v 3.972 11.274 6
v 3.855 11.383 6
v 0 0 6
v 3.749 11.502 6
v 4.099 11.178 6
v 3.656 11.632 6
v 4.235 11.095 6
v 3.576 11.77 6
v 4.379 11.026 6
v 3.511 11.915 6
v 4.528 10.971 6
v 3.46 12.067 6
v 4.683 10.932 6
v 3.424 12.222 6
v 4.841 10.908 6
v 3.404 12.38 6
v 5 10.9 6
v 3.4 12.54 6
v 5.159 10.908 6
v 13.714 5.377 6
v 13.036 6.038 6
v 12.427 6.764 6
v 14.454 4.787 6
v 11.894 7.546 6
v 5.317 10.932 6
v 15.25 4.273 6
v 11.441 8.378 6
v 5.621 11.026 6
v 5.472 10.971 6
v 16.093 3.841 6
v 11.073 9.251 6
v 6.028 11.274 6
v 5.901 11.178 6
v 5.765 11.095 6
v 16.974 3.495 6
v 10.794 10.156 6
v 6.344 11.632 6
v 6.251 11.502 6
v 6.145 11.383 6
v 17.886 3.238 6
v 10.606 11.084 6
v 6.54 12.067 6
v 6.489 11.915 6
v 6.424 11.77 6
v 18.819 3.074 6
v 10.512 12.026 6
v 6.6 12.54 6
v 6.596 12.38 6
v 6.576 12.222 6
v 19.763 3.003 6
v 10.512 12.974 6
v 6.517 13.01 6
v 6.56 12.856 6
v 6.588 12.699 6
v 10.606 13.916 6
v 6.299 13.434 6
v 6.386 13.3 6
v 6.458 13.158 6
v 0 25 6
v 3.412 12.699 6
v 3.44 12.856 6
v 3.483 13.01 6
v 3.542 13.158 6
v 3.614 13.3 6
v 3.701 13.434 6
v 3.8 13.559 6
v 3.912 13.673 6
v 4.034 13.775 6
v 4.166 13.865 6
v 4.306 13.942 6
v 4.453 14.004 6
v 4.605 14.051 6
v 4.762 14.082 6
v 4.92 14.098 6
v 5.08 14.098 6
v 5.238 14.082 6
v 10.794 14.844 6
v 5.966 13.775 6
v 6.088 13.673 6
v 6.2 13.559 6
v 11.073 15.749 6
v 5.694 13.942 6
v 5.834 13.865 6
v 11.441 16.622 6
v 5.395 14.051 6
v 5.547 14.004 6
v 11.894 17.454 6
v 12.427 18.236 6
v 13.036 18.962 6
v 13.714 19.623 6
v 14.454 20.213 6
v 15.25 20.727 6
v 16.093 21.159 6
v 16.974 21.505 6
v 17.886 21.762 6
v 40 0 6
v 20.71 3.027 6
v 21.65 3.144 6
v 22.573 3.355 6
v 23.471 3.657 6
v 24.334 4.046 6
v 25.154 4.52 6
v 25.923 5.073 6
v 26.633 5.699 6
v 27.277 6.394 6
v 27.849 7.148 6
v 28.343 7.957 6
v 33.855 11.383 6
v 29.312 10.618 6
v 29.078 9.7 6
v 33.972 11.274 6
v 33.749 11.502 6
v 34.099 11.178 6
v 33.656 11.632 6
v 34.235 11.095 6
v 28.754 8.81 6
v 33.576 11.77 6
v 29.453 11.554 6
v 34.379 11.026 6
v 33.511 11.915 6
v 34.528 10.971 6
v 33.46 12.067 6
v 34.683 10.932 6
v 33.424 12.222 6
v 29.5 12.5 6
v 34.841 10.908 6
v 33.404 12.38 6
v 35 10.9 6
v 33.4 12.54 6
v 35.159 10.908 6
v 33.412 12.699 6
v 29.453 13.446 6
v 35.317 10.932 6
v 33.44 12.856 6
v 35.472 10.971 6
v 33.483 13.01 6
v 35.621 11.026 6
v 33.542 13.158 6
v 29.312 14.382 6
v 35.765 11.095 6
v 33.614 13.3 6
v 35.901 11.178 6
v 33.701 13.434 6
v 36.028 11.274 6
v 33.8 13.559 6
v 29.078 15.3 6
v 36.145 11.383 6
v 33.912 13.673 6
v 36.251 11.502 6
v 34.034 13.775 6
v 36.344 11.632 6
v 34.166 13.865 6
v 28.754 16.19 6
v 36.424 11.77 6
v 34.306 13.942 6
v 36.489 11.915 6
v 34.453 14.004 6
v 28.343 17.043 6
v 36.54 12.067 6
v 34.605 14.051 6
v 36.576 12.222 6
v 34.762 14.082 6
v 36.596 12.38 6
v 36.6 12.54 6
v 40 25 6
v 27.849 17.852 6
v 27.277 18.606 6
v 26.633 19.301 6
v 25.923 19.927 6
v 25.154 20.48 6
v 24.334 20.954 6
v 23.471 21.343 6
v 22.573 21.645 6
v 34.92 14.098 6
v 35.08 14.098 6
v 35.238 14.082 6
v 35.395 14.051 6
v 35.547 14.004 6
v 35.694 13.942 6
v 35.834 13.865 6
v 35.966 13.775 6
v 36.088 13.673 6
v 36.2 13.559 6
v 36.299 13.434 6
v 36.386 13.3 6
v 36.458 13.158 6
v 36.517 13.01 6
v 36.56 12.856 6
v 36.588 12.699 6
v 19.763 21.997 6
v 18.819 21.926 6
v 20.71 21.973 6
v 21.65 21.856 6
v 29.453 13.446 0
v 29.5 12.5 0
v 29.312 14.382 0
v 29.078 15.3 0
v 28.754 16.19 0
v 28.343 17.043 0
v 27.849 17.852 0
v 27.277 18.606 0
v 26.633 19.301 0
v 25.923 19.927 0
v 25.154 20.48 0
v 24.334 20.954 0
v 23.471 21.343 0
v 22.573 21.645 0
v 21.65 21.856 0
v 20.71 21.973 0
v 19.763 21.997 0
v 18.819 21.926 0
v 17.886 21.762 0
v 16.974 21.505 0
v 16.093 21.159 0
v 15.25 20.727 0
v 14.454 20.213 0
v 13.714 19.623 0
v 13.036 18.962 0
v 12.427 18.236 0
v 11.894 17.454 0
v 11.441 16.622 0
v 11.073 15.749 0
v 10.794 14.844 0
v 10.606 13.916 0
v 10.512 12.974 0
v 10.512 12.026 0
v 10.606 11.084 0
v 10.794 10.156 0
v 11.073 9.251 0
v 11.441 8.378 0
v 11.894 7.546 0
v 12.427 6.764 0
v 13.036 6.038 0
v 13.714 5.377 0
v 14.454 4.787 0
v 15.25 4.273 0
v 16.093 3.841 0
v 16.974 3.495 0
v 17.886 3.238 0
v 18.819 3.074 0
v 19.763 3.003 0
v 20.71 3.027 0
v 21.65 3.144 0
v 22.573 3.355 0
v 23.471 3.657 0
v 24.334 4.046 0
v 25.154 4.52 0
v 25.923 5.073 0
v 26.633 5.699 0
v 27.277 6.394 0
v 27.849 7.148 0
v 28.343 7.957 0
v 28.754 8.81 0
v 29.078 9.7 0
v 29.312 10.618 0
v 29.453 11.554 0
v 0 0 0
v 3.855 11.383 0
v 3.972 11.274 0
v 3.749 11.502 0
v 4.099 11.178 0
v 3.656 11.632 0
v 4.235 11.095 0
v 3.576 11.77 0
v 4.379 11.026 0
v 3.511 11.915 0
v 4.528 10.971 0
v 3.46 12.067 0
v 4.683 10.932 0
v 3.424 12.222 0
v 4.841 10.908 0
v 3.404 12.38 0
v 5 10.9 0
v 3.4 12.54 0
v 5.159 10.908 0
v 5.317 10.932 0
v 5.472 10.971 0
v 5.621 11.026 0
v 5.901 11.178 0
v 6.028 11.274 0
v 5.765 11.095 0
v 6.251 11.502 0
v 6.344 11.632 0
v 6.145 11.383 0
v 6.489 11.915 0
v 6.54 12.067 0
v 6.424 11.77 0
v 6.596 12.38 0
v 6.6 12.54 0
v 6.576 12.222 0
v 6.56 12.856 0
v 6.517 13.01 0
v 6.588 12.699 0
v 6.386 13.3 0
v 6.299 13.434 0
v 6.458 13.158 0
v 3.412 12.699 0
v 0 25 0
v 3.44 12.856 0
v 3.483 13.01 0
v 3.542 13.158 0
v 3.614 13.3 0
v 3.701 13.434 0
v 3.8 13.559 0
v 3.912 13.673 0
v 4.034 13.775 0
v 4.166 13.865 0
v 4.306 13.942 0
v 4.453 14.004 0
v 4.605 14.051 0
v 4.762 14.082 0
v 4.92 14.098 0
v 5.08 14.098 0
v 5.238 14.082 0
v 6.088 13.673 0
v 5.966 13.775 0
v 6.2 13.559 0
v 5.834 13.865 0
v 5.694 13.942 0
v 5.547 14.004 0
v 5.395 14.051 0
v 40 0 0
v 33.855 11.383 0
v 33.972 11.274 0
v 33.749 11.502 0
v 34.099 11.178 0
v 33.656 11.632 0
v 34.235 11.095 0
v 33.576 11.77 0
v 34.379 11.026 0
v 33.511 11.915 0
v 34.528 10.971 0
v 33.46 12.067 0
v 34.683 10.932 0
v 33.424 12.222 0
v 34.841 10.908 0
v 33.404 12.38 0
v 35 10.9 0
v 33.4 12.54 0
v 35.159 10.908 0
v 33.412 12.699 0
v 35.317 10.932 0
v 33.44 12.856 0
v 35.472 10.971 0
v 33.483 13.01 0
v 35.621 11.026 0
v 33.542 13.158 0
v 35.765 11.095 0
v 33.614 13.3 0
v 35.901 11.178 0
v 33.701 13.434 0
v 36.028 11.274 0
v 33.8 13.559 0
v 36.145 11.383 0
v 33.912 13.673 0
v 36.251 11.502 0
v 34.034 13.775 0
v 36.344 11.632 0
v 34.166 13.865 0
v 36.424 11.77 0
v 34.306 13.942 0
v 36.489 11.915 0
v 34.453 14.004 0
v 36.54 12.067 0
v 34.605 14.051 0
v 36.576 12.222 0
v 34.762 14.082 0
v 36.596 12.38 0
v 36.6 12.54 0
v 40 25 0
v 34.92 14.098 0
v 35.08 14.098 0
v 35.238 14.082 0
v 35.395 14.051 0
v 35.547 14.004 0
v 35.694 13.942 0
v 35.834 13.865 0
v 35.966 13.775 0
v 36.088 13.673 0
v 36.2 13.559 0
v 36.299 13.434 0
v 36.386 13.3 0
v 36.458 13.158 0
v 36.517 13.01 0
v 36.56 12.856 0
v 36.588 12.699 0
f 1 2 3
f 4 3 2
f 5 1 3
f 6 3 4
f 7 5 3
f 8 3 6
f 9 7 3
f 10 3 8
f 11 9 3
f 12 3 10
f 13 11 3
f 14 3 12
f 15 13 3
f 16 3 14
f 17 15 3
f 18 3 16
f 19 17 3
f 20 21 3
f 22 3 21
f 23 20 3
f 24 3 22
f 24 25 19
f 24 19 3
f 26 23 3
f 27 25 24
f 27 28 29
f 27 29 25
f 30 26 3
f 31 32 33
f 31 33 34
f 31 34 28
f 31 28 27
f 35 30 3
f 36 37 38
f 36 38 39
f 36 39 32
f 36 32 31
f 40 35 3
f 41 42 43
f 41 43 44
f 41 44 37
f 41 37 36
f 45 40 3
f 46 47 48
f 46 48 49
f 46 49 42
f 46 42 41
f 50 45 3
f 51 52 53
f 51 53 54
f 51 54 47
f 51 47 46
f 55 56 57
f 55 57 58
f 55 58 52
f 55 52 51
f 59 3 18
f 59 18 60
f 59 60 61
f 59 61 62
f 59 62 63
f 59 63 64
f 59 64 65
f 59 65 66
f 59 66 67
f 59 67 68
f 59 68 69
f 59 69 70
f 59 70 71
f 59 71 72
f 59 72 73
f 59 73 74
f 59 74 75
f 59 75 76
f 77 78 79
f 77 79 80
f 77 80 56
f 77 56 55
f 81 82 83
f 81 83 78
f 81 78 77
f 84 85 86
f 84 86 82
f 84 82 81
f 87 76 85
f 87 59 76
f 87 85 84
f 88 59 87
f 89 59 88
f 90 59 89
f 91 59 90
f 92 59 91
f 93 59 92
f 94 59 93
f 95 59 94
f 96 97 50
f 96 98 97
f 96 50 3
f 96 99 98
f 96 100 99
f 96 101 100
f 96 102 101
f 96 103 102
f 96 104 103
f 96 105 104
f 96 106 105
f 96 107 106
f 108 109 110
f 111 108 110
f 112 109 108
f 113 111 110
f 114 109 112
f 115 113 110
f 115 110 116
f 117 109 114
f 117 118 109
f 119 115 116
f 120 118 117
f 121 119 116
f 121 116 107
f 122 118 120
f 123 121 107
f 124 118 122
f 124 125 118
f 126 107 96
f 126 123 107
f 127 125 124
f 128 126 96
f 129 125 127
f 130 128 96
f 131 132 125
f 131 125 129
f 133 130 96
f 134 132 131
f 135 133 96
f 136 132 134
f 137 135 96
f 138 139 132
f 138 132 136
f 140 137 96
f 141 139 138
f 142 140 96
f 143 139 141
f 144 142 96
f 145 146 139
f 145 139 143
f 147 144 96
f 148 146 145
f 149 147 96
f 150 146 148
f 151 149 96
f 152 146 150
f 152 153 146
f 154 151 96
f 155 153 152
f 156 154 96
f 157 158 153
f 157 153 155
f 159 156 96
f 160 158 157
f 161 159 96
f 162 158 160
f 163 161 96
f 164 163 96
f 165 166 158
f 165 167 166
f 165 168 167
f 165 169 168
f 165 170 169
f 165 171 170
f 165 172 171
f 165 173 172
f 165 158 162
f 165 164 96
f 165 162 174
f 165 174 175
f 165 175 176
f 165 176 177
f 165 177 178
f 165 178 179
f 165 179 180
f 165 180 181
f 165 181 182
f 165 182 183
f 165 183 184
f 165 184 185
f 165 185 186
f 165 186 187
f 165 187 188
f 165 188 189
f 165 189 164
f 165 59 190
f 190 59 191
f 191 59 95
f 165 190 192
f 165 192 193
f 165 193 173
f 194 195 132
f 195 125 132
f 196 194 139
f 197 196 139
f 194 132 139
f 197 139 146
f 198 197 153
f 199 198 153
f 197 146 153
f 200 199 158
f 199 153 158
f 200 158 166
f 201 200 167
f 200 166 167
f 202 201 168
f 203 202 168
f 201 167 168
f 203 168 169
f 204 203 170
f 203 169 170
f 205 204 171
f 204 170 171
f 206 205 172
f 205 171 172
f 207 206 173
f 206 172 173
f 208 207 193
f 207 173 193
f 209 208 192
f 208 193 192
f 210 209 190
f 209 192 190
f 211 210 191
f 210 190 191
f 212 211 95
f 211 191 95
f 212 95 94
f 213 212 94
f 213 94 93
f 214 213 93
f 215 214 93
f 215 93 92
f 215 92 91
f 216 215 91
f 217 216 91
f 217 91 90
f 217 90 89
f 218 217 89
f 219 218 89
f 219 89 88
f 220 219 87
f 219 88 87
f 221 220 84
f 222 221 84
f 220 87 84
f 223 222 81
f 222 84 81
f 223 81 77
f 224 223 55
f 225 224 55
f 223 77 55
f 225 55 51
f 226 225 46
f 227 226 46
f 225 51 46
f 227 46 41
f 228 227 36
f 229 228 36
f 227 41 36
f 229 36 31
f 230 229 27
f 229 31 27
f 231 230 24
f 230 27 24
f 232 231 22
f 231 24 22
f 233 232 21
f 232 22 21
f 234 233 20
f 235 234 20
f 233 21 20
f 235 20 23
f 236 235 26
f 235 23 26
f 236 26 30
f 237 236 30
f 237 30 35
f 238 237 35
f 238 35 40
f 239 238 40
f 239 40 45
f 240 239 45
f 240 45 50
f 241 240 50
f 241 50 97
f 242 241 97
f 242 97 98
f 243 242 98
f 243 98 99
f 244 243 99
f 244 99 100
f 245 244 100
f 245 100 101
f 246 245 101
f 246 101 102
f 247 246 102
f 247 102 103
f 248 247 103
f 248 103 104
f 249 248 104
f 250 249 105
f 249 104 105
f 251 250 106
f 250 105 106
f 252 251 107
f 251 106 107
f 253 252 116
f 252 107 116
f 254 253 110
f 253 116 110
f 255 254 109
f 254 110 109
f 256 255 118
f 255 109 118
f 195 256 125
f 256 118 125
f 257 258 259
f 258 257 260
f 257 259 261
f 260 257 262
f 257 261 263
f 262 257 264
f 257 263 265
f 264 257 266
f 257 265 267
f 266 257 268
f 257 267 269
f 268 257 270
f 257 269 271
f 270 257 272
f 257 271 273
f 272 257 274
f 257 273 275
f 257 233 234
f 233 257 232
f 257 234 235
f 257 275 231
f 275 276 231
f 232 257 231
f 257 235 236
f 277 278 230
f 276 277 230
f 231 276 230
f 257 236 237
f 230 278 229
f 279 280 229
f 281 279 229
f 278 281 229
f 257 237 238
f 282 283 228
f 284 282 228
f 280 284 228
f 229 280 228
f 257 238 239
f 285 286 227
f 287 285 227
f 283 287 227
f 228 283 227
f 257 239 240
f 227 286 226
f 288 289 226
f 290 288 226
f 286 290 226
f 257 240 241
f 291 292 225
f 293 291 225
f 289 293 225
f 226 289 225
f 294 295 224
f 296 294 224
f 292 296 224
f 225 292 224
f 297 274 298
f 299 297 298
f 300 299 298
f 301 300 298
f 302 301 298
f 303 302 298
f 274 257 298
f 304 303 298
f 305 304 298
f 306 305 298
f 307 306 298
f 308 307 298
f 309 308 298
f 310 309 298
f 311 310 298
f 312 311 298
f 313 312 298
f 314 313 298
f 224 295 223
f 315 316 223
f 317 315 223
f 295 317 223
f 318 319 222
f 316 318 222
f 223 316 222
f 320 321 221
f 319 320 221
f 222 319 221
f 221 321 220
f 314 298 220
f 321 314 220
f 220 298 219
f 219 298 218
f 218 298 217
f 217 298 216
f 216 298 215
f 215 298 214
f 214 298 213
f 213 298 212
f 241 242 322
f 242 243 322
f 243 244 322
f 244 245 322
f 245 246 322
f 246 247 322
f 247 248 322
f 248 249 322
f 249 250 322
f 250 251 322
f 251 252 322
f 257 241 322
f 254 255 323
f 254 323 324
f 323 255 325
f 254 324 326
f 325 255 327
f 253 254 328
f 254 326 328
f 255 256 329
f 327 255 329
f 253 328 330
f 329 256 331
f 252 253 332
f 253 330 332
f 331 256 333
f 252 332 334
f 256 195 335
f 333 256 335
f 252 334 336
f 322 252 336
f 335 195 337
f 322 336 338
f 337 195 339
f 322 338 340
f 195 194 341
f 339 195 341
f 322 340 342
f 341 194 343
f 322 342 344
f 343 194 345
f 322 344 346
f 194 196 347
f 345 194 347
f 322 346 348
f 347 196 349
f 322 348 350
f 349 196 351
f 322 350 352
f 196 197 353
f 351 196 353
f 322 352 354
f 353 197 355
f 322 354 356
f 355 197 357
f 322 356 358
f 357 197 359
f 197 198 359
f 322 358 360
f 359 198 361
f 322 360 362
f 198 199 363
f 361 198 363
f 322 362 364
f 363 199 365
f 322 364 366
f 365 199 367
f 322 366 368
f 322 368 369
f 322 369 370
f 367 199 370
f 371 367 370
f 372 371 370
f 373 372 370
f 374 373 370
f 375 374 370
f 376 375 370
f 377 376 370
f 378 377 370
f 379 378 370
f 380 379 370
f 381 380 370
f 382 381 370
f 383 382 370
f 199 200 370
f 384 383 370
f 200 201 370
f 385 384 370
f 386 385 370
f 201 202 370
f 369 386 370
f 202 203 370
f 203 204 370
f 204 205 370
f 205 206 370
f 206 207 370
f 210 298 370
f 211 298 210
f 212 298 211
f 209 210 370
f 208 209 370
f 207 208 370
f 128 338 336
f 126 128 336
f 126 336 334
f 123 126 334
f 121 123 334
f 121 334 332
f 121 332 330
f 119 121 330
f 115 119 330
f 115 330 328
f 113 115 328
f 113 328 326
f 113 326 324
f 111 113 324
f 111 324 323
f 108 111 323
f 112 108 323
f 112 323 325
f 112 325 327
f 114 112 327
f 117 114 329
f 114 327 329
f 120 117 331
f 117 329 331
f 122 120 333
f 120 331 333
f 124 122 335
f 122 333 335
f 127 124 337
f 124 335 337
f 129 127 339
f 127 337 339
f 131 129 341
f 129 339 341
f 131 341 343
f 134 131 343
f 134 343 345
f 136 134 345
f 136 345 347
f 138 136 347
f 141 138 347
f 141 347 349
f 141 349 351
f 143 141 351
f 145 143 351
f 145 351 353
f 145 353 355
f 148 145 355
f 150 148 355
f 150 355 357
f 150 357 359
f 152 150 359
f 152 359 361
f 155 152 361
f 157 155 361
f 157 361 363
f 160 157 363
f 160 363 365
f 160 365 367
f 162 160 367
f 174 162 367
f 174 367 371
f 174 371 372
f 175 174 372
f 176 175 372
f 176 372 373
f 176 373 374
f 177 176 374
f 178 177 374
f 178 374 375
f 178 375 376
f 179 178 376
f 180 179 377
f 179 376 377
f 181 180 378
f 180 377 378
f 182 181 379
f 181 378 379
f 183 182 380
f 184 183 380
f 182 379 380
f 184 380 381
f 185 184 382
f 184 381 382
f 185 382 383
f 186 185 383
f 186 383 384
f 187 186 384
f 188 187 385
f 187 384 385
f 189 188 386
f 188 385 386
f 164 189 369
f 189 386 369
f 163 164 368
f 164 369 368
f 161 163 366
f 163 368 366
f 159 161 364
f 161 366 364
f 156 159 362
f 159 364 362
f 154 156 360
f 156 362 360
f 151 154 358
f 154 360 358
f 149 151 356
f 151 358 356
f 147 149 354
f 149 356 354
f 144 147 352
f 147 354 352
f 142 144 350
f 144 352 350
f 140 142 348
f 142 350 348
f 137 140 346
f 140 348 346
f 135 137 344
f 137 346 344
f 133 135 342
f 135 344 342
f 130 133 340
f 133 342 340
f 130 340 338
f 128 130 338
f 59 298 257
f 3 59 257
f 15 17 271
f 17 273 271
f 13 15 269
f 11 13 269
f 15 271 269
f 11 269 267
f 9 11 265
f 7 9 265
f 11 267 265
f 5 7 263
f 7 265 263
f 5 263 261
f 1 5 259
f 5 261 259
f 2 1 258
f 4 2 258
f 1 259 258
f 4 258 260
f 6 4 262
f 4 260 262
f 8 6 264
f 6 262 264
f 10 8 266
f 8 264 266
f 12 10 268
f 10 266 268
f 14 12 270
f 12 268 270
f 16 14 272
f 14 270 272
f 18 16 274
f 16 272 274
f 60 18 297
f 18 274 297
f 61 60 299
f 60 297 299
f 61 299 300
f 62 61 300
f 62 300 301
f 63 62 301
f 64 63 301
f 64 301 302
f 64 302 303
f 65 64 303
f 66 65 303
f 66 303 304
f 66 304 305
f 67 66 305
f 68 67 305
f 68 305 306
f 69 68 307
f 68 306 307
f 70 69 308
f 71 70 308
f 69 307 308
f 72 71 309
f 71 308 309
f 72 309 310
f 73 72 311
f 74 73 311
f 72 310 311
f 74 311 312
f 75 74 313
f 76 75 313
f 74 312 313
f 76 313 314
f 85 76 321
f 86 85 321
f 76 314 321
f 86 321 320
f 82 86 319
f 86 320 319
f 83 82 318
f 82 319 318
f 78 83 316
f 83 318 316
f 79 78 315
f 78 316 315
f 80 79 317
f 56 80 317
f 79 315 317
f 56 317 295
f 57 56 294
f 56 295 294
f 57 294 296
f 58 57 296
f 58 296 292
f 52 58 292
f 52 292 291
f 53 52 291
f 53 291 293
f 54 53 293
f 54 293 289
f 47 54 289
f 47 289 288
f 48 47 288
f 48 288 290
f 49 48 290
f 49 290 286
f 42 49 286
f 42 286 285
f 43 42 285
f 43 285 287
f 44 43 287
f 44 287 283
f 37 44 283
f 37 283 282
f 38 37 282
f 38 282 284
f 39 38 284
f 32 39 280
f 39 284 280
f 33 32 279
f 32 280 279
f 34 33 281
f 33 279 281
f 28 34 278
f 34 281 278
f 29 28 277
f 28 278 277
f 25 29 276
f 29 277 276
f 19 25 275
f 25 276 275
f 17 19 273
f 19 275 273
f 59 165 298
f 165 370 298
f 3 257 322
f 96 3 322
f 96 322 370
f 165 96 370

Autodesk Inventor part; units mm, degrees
ref_plane "YZ Plane" through (0, 0, 0) normal (1, 0, 0) x (0, 1, 0)
ref_plane "XZ Plane" through (0, 0, 0) normal (0, 1, 0) x (-1, 0, 0)
ref_plane "XY Plane" through (0, 0, 0) normal (0, 0, 1) x (1, 0, 0)
sketch "スケッチ1" plane through (0, 0, 0) normal (0, 0, 1) x (1, 0, 0)
  line L0 (0, 0) -> (40, 0)
  line L1 (40, 0) -> (40, 25)
  line L2 (40, 25) -> (0, 25)
  line L3 (0, 25) -> (0, 0)
  dimension "d0" = 40
  dimension "d1" = 25
extrude "押し出し1" add sketch "スケッチ1" along normal blind 6
sketch "スケッチ2" plane through (0, 0, 6) normal (0, 0, 1) x (1, 0, 0)
  circle A0 centre (20, 12.5) radius 9.5
  line L0 (0, 0) -> (40, 0) projected
  line L1 (0, 25) -> (0, 0) projected
  dimension "d4" = 19
  dimension "d5" = 12.5
  dimension "d6" = 20
extrude "押し出し2" cut sketch "スケッチ2" against normal blind 6
sketch "スケッチ3" plane through (0, 0, 6) normal (0, 0, 1) x (1, 0, 0)
  circle A0 centre (5, 12.5) radius 1.6
  circle A1 centre (35, 12.5) radius 1.6
  line L0 (0, 25) -> (0, 0) projected
  line L1 (0, 0) -> (40, 0) projected
  line L2 (40, 0) -> (40, 25) projected
  dimension "d9" = 3.2
  dimension "d10" = 3.2
  dimension "d11" = 5
  dimension "d12" = 12.5
  dimension "d13" = 5
  dimension "d14" = 12.5
hole "穴1" at (5, 12.5, 6) at (35, 12.5, 6) direction (0, 0, -1) diameter 3.2 depth 6
equation "\"BendRadius\" = Thickness"
equation "\"BendReliefWidth\" = Thickness"
equation "\"BendReliefDepth\" = 0.5 * Thickness"
equation "\"CornerReliefSize\" = 4 * Thickness"
equation "\"MinimumRemnant\" = 2 * Thickness"
equation "\"TransitionRadius\" = BendRadius"
equation "\"JacobiRadiusSize\" = BendRadius"
equation "\"GapSize\" = Thickness"
equation "\"Thickness\" = 0.5"
properties part number "nhk46"
